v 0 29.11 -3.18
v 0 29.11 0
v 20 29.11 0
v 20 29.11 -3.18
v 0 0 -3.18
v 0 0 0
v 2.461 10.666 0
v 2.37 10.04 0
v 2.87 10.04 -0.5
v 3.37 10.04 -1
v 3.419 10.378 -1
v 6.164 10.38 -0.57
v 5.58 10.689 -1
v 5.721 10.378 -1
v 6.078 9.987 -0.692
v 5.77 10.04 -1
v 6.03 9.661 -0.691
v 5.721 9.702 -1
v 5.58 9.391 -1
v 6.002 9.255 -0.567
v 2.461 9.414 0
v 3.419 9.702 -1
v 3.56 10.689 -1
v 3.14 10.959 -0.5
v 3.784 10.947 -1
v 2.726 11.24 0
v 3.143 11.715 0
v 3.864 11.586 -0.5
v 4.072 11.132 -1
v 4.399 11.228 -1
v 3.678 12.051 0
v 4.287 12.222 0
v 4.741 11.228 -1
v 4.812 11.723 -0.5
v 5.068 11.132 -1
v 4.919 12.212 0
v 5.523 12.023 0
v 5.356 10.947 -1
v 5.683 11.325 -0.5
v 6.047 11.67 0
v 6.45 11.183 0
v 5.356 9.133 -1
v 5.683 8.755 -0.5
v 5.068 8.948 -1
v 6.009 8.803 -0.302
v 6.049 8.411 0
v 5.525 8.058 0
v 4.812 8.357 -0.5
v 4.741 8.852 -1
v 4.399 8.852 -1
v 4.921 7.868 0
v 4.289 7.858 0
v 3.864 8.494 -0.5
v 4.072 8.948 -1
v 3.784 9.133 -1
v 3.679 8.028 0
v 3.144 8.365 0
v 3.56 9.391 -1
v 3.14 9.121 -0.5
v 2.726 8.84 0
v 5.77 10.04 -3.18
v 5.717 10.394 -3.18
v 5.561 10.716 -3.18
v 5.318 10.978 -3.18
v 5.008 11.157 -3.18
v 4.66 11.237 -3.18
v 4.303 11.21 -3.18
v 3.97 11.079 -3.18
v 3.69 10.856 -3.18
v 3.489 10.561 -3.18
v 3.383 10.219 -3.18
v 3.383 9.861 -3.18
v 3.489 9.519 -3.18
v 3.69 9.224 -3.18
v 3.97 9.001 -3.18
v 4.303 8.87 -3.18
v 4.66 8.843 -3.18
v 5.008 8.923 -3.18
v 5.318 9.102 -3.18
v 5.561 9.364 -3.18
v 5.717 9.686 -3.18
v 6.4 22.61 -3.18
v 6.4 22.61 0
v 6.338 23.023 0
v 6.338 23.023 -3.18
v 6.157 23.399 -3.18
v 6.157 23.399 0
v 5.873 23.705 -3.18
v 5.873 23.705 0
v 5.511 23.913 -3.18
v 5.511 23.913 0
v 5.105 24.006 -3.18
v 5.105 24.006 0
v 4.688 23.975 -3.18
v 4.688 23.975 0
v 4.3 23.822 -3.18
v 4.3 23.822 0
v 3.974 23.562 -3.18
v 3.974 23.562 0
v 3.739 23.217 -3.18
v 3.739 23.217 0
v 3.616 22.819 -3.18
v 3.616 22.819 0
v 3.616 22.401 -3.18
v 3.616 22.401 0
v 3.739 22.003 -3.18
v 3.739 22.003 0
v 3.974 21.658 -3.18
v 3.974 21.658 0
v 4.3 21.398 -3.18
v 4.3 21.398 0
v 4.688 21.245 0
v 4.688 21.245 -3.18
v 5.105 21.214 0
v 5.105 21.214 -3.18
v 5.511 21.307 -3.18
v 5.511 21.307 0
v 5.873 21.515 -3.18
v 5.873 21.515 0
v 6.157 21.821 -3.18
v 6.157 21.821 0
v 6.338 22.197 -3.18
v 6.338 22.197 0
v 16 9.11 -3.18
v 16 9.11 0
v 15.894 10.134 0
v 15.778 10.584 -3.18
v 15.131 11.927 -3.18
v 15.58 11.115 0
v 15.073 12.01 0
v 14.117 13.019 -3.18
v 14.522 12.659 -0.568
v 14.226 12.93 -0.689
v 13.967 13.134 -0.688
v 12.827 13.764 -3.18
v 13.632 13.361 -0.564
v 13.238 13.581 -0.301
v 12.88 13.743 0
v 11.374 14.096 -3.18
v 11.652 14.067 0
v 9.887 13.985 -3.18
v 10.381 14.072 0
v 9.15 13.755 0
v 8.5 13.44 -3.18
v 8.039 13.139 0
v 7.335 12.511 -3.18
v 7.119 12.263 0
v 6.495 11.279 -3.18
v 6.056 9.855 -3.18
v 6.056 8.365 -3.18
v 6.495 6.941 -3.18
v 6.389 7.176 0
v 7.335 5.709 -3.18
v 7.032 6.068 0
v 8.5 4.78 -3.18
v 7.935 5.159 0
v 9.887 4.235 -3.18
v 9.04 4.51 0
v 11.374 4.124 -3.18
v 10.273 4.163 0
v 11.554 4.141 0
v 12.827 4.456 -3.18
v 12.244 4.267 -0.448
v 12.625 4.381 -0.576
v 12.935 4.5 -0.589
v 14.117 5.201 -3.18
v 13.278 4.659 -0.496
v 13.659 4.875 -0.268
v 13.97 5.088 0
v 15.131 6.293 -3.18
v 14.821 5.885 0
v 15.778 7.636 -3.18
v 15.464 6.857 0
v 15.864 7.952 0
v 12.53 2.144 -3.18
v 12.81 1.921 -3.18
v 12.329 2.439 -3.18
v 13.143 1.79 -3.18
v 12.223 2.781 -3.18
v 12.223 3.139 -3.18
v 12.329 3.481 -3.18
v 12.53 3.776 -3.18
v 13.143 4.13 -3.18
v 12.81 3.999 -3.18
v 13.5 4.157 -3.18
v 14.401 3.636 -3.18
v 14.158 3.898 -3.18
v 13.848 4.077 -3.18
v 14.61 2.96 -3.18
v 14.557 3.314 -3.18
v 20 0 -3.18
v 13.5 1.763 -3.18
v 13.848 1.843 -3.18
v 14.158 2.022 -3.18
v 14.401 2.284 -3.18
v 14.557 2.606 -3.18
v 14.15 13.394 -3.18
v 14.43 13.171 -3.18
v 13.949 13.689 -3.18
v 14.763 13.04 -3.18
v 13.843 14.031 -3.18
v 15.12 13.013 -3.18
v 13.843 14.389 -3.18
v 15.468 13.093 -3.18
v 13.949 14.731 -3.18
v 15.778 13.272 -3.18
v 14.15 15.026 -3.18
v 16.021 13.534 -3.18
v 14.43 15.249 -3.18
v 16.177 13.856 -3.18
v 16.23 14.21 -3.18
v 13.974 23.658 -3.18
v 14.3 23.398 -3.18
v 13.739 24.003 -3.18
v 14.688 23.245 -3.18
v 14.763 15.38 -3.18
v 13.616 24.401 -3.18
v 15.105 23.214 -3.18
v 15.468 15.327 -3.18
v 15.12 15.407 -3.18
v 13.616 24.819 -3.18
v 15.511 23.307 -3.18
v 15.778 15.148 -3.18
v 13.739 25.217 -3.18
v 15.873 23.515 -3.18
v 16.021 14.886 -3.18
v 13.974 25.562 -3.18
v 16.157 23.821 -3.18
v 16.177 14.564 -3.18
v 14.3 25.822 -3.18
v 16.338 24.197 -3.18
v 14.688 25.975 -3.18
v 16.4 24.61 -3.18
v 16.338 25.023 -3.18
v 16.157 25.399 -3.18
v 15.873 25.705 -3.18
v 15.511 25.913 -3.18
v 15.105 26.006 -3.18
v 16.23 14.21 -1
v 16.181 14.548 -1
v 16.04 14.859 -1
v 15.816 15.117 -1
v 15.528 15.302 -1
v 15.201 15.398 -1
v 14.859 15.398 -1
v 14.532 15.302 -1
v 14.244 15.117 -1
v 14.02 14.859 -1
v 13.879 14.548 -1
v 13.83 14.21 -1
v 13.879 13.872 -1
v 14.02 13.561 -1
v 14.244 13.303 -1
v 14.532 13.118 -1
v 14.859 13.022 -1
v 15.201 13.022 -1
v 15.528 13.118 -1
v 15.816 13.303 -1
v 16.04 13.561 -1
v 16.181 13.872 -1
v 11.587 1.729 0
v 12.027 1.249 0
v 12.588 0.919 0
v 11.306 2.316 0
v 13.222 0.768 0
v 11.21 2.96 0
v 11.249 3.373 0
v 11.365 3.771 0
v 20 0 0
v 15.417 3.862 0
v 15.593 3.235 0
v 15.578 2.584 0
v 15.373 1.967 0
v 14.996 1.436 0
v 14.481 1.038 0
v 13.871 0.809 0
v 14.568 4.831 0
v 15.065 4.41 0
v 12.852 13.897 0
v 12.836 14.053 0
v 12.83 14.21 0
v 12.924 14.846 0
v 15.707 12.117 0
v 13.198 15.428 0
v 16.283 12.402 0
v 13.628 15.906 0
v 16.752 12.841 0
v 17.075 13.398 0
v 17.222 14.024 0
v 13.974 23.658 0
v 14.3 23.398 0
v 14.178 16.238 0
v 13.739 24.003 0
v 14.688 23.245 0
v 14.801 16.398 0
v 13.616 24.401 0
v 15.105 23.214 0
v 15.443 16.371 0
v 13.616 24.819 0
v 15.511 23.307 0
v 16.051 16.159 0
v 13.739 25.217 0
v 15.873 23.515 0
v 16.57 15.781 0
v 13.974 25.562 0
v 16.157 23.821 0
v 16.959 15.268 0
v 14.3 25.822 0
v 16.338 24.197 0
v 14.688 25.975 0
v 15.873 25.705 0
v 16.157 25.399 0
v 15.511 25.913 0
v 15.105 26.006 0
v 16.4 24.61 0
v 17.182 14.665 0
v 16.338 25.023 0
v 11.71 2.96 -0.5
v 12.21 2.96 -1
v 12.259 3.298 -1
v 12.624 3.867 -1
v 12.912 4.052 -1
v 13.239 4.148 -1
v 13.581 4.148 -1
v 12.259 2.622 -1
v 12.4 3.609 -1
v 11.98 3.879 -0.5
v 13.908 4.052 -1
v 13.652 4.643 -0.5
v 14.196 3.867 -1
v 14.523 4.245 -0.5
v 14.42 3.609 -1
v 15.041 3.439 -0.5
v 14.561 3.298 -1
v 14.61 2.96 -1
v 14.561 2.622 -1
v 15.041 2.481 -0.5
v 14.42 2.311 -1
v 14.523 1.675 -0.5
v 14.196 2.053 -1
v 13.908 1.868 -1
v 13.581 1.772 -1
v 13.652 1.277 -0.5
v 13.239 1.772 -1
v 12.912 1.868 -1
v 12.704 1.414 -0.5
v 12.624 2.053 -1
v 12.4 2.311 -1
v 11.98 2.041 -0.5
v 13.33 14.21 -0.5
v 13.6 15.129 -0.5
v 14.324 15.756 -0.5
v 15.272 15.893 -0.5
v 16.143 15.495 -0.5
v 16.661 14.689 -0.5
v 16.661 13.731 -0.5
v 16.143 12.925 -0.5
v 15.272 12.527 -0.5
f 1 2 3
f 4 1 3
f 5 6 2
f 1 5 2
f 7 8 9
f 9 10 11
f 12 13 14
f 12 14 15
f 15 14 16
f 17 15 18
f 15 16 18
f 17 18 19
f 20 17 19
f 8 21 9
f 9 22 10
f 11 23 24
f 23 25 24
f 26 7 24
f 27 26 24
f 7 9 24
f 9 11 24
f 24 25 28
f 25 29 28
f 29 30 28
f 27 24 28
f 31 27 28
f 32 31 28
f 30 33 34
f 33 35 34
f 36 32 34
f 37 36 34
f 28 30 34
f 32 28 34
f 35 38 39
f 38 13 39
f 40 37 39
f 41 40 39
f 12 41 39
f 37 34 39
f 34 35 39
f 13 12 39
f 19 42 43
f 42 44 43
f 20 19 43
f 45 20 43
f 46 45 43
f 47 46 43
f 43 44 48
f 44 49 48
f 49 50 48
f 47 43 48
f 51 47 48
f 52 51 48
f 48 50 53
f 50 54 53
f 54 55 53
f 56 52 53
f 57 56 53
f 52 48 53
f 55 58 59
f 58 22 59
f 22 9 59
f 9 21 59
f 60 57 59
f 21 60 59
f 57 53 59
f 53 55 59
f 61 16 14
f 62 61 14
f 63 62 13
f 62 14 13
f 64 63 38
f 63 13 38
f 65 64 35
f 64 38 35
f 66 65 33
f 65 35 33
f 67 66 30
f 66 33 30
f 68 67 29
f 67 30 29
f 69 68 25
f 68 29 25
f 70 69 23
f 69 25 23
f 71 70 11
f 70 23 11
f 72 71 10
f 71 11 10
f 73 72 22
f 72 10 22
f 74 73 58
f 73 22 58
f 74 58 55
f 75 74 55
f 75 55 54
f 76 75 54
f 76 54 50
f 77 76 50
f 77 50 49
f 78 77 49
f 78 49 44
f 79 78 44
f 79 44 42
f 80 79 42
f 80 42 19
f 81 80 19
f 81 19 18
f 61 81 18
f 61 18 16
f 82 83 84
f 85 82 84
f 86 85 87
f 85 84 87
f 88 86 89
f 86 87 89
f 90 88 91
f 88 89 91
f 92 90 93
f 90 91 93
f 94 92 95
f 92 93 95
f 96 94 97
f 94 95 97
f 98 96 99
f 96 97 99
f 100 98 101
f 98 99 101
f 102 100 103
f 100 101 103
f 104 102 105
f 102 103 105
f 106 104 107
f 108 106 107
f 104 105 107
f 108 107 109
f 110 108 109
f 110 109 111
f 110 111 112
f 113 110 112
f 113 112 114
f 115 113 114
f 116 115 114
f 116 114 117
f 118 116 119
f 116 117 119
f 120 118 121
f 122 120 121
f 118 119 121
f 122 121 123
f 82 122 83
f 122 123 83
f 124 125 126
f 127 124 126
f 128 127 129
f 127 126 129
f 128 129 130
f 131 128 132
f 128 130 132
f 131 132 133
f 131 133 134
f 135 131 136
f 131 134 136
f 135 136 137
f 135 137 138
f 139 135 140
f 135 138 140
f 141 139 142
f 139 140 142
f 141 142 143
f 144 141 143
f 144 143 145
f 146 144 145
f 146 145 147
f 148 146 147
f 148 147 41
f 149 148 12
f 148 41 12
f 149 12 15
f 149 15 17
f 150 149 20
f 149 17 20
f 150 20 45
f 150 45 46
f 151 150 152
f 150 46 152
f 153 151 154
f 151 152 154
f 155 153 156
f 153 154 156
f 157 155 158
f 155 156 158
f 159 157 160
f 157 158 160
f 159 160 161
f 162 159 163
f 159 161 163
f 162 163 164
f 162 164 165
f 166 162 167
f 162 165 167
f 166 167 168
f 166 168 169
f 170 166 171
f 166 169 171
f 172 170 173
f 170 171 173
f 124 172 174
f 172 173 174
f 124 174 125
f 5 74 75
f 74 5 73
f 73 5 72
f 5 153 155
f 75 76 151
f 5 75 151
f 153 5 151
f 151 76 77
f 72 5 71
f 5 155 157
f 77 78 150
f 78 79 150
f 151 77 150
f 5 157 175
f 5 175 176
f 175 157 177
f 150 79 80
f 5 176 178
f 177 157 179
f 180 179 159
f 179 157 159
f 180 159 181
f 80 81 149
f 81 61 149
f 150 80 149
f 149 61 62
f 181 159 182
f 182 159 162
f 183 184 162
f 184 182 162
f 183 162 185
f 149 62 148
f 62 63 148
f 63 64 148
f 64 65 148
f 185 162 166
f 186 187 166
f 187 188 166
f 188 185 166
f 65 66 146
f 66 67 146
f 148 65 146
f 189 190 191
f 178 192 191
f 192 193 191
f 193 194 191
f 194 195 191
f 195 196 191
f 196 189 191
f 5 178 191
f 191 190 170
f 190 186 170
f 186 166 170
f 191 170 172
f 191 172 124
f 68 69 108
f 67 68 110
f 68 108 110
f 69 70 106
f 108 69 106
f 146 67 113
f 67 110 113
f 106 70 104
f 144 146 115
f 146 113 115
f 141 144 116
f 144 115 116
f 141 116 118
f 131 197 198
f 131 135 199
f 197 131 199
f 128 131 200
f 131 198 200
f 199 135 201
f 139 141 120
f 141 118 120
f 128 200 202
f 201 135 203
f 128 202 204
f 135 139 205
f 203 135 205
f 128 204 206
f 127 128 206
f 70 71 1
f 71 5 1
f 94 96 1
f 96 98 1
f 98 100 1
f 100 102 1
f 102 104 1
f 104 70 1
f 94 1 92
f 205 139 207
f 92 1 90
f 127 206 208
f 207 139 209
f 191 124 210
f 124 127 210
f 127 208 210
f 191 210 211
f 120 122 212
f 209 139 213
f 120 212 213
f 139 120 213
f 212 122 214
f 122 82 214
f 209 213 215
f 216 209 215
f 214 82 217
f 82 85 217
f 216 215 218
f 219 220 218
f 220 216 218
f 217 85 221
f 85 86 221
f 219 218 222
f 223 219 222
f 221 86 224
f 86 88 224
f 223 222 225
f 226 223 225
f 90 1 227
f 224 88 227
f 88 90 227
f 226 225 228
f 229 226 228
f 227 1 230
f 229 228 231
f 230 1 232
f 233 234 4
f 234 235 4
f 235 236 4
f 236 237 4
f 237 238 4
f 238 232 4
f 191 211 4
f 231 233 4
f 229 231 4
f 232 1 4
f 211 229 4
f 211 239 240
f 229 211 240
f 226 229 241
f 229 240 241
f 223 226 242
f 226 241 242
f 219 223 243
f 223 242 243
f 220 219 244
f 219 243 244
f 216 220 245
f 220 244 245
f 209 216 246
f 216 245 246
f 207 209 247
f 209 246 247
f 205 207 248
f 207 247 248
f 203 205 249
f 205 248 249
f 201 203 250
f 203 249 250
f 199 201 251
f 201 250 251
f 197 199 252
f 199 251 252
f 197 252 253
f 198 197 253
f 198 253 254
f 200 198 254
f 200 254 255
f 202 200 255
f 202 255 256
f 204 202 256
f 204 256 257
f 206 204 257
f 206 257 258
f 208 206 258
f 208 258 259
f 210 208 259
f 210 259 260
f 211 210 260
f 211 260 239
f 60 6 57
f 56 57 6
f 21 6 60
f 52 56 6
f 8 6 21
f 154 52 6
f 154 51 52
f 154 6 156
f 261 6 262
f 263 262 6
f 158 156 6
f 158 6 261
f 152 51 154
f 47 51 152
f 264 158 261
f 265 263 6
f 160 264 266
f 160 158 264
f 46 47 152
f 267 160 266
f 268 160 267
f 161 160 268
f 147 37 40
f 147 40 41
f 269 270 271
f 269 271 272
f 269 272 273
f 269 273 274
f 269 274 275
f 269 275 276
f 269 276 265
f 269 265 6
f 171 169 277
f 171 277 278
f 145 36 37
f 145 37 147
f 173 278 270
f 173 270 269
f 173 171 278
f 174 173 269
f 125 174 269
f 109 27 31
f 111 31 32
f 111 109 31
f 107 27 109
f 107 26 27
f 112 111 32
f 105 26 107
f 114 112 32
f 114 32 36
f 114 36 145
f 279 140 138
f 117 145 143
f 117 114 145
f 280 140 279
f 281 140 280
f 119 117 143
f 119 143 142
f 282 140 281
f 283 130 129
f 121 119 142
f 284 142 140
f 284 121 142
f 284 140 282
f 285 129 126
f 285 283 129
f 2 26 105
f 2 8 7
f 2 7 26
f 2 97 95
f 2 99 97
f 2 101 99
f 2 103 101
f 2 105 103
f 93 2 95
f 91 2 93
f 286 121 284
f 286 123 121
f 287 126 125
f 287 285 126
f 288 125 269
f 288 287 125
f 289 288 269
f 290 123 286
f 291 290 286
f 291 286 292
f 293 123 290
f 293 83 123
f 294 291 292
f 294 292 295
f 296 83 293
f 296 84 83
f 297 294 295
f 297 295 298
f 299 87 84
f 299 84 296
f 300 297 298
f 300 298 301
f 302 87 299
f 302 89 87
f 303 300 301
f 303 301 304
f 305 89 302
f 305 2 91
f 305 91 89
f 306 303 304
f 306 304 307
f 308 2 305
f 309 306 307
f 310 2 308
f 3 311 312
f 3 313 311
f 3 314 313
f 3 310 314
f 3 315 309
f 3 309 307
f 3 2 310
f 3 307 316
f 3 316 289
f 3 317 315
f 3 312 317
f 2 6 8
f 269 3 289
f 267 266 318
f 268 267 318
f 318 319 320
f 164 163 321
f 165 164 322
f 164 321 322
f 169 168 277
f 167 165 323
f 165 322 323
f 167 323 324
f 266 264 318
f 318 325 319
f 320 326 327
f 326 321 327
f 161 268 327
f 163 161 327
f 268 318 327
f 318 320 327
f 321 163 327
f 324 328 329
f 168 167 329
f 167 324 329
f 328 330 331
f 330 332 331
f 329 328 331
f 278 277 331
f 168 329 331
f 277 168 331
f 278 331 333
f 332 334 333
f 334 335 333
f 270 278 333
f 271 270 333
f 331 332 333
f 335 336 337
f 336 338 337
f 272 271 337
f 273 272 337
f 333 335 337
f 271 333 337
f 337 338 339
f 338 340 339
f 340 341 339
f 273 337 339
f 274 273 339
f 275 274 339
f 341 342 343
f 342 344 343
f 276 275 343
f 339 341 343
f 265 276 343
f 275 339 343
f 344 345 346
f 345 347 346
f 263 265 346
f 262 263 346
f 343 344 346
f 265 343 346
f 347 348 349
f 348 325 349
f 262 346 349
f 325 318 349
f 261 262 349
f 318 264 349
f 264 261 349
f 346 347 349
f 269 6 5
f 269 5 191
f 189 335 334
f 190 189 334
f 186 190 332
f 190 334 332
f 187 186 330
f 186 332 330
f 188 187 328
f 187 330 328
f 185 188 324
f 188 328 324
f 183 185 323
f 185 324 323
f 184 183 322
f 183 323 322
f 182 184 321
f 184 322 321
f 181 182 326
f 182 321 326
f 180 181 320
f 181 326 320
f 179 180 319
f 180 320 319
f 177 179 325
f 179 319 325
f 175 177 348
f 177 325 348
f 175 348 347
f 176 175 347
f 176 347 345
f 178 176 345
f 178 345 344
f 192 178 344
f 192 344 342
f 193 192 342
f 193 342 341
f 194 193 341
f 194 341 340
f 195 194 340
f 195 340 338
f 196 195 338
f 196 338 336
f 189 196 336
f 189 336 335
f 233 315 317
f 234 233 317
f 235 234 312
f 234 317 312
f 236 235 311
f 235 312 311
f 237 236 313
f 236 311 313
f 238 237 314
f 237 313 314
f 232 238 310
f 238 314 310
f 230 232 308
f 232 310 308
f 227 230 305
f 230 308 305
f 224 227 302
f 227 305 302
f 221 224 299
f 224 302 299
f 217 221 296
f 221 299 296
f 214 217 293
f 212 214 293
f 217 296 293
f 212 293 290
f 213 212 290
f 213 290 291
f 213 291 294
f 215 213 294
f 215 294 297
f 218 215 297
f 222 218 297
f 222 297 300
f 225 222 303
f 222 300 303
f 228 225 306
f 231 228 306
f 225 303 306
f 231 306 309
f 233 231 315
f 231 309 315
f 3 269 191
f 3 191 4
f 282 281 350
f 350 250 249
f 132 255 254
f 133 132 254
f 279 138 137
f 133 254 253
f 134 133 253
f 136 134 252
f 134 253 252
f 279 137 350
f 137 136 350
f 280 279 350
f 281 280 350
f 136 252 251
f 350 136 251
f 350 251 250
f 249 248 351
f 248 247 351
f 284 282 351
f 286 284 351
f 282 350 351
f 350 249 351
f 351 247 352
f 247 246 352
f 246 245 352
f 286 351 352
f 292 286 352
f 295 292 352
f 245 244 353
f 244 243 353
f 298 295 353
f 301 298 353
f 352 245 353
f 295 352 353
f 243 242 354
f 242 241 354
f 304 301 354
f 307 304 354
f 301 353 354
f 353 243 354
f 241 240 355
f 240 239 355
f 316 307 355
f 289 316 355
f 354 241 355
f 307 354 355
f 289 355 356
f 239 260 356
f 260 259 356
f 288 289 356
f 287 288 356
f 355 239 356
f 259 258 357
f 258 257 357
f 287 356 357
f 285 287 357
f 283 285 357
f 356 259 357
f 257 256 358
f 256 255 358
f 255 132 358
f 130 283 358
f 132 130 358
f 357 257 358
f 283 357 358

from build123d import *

# Parameters (mm, degrees)
SKETCH1_W                                       = 20
SKETCH1_H                                       = 29.11
SKETCH1_R                                       = 1.4
SKETCH1_R_2                                     = 1.2
SKETCH1_R_3                                     = 5
BOSS_EXTRUDE2_DEPTH                             = 3.18
CSK_FOR_M2_FLAT_HEAD_MACHINE_SCREW1_D           = 2.4
CSK_FOR_M2_FLAT_HEAD_MACHINE_SCREW1_DEPTH       = 3.508967257
CSK_FOR_M2_FLAT_HEAD_MACHINE_SCREW1_CSINK_D     = 4.4
CSK_FOR_M2_FLAT_HEAD_MACHINE_SCREW1_CSINK_ANGLE = 90
CSK_FOR_M2_FLAT_HEAD_MACHINE_SCREW1_TIP         = 0.721032743


with BuildPart() as part:
    # Sketch1 → Boss-Extrude2 (new body)
    with BuildSketch(Plane.XY):
        with Locations((10, 14.555)):
            Rectangle(SKETCH1_W, SKETCH1_H)
        with Locations((5, 22.61)):
            Circle(SKETCH1_R, mode=Mode.SUBTRACT)
        with Locations((15, 24.61)):
            Circle(SKETCH1_R, mode=Mode.SUBTRACT)
        with Locations((15.03, 14.21)):
            Circle(SKETCH1_R_2, mode=Mode.SUBTRACT)
        with Locations((4.57, 10.04)):
            Circle(SKETCH1_R_2, mode=Mode.SUBTRACT)
        with Locations((13.41, 2.96)):
            Circle(SKETCH1_R_2, mode=Mode.SUBTRACT)
        with Locations((11, 9.11)):
            Circle(SKETCH1_R_3, mode=Mode.SUBTRACT)
    extrude(amount=-BOSS_EXTRUDE2_DEPTH)

    # CSK for M2 Flat Head Machine Screw1
    with Locations(Plane.XY):
        with Locations((4.57, 10.04), (15.03, 14.21), (13.41, 2.96)):
            CounterSinkHole(CSK_FOR_M2_FLAT_HEAD_MACHINE_SCREW1_D / 2, CSK_FOR_M2_FLAT_HEAD_MACHINE_SCREW1_CSINK_D / 2, depth=CSK_FOR_M2_FLAT_HEAD_MACHINE_SCREW1_DEPTH, counter_sink_angle=CSK_FOR_M2_FLAT_HEAD_MACHINE_SCREW1_CSINK_ANGLE)
            with Locations((0, 0, -(CSK_FOR_M2_FLAT_HEAD_MACHINE_SCREW1_DEPTH + CSK_FOR_M2_FLAT_HEAD_MACHINE_SCREW1_TIP / 2))):  # 118° drill point
                Cone(0, CSK_FOR_M2_FLAT_HEAD_MACHINE_SCREW1_D / 2, CSK_FOR_M2_FLAT_HEAD_MACHINE_SCREW1_TIP, mode=Mode.SUBTRACT)


solid = part.part
